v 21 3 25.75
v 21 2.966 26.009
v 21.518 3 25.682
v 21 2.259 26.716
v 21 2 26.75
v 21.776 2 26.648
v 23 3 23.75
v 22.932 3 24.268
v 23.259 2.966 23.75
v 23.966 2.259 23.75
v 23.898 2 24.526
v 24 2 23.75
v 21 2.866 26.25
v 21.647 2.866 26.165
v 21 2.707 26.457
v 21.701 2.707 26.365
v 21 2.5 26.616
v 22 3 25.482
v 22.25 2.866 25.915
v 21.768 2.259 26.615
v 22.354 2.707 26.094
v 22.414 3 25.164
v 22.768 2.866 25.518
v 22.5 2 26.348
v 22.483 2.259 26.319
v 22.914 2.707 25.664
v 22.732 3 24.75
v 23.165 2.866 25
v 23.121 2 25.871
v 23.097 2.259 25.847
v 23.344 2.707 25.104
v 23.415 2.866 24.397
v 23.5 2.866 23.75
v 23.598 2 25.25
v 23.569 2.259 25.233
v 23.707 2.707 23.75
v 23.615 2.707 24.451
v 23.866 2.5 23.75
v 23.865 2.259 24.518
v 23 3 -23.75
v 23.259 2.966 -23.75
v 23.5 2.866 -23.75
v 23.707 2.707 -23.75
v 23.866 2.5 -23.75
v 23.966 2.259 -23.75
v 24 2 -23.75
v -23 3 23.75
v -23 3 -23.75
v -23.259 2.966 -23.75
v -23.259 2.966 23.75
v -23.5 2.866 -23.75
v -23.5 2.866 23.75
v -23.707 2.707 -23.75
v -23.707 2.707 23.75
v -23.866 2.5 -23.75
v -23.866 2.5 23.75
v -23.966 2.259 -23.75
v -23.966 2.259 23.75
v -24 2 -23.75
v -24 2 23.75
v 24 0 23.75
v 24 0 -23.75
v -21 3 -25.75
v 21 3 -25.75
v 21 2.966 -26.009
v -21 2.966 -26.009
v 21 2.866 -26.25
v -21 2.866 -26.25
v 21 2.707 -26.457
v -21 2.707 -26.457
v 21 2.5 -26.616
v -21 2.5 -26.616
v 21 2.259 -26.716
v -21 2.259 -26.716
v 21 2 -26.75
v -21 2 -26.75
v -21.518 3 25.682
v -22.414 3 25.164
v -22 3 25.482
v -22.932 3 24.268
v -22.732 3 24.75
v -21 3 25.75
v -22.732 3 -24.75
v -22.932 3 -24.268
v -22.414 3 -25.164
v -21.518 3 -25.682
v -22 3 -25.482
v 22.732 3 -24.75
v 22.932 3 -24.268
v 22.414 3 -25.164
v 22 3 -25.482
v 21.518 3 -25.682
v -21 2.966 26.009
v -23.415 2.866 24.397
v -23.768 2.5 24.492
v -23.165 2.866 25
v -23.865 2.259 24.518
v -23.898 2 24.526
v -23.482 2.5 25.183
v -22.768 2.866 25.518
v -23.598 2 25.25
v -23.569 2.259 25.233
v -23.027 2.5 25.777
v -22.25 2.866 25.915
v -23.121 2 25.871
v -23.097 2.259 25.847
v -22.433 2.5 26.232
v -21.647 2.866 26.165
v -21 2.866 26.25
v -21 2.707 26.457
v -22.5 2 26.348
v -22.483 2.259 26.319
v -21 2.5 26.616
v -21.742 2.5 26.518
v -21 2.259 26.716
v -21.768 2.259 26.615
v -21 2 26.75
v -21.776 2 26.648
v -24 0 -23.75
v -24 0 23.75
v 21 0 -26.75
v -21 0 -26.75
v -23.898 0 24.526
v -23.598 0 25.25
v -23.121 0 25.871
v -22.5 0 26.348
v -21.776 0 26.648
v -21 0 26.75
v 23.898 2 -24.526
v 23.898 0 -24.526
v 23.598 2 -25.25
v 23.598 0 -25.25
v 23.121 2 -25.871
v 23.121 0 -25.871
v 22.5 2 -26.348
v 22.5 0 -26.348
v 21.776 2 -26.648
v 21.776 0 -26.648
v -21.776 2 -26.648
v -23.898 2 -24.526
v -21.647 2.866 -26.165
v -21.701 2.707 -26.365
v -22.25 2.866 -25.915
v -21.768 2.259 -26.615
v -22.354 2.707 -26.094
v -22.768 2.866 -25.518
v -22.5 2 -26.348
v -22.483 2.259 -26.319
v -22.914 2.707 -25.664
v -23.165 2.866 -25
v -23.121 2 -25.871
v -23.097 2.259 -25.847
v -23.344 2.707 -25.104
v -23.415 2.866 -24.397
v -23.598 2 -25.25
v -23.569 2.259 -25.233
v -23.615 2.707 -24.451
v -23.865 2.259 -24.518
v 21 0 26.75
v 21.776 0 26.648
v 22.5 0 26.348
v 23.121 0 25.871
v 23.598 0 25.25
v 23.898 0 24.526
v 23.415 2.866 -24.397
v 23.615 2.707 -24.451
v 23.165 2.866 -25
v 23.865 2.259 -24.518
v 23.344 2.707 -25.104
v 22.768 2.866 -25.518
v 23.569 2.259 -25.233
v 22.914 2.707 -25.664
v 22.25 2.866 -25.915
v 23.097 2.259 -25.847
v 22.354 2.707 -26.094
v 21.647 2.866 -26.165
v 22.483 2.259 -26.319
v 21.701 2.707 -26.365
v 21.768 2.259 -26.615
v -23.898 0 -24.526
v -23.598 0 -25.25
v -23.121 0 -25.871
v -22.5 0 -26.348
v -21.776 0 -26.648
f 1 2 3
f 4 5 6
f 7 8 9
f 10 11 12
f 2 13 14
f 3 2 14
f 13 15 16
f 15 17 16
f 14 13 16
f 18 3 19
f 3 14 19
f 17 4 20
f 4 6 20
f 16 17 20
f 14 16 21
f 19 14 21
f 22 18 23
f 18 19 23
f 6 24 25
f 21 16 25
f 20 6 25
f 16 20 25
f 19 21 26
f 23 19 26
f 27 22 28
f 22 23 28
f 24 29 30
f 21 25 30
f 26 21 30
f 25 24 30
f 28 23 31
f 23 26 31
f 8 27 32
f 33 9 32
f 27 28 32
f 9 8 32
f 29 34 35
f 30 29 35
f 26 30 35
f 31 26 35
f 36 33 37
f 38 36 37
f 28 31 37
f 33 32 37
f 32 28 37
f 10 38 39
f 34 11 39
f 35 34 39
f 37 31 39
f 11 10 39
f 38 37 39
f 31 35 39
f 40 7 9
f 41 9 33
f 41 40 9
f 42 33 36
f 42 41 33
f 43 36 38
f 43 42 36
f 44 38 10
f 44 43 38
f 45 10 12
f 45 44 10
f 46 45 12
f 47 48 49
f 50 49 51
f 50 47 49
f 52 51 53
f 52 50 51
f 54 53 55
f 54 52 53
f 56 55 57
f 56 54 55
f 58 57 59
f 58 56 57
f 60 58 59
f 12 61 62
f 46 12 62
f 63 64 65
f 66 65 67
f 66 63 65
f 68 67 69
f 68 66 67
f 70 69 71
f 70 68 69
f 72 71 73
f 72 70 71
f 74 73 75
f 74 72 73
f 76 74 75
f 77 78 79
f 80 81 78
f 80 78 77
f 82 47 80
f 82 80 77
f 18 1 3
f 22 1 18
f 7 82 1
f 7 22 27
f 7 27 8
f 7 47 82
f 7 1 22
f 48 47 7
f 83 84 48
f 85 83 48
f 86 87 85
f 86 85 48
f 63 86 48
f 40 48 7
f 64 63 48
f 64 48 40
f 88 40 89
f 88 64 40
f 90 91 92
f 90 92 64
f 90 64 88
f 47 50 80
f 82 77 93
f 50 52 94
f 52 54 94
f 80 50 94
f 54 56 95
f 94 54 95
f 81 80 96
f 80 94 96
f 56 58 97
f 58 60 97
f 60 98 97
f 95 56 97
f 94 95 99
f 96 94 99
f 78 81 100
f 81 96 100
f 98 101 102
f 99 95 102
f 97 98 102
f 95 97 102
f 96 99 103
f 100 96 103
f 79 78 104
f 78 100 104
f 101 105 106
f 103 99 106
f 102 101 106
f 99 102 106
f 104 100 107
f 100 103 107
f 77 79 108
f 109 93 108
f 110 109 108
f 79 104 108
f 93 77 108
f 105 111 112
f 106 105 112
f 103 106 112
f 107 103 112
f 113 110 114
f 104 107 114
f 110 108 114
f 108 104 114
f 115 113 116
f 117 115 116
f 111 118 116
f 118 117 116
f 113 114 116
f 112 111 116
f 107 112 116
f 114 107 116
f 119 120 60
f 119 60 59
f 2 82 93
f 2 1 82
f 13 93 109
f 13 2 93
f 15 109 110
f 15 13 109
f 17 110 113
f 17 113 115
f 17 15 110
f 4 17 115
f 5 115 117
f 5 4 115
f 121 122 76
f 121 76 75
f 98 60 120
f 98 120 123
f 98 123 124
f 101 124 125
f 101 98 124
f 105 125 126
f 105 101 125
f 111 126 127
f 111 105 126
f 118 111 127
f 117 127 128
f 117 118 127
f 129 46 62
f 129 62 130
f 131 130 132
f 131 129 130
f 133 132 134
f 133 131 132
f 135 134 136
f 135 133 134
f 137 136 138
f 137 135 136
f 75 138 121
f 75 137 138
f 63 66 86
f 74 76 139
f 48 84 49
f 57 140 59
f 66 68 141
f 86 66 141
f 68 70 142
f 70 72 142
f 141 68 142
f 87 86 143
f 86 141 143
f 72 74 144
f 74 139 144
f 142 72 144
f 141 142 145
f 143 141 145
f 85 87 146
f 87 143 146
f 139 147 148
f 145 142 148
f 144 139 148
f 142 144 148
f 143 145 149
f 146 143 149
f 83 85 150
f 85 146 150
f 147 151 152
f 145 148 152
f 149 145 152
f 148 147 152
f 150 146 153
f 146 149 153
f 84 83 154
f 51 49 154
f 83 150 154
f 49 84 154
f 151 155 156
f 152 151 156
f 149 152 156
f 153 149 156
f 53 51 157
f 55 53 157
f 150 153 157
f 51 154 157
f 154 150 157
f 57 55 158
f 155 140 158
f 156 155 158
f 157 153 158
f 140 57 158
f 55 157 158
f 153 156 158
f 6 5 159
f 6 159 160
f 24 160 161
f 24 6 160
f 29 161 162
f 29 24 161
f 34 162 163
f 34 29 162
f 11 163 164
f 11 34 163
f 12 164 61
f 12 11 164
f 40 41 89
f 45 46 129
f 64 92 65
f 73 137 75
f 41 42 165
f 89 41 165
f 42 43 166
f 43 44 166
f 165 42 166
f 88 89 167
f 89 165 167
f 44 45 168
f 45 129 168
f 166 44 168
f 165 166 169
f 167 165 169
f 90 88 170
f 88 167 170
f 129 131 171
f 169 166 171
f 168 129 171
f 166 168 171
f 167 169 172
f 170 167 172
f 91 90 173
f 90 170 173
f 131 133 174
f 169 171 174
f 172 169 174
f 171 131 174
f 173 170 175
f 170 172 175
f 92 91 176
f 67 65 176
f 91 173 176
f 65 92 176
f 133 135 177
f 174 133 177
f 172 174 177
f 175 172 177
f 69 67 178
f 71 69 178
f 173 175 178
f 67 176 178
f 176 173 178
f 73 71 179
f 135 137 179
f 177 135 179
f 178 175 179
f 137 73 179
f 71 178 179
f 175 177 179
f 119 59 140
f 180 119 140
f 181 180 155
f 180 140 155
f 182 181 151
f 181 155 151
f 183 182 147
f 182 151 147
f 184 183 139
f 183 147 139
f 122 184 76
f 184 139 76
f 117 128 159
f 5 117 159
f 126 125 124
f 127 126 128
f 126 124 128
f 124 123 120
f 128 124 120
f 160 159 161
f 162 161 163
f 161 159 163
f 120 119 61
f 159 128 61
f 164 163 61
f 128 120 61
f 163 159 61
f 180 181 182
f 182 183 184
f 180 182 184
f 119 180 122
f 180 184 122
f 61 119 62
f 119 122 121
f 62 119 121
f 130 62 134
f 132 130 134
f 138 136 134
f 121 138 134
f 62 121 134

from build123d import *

# Parameters (mm, degrees)
SKETCH1_W           = 48
SKETCH1_H           = 53.5
BOSS_EXTRUDE1_DEPTH = 3
FILLET1_R           = 3
FILLET2_R           = 1


with BuildPart() as part:
    # Sketch1 → Boss-Extrude1 (new body)
    with BuildSketch(Plane(origin=(0, 0, 0), x_dir=(1, 0, 0), z_dir=(0, 1, 0))):
        Rectangle(SKETCH1_W, SKETCH1_H)
    extrude(amount=BOSS_EXTRUDE1_DEPTH)

    # Fillet1
    fillet1_edges = [part.edges().sort_by_distance(p)[0] for p in [
        (24, 1.5, 26.75),
        (-24, 1.5, 26.75),
        (-24, 1.5, -26.75),
        (24, 1.5, -26.75),
    ]]
    fillet(fillet1_edges, radius=FILLET1_R)

    # Fillet2
    fillet2_edges = [part.edges().sort_by_distance(p)[0] for p in [
        (0, 3, 26.75),
        (-24, 3, 0),
        (24, 3, 0),
        (0, 3, -26.75),
        (23.121320344, 3, 25.871320344),
        (23.121320344, 3, -25.871320344),
        (-23.121320344, 3, -25.871320344),
        (-23.121320344, 3, 25.871320344),
    ]]
    fillet(fillet2_edges, radius=FILLET2_R)


solid = part.part
